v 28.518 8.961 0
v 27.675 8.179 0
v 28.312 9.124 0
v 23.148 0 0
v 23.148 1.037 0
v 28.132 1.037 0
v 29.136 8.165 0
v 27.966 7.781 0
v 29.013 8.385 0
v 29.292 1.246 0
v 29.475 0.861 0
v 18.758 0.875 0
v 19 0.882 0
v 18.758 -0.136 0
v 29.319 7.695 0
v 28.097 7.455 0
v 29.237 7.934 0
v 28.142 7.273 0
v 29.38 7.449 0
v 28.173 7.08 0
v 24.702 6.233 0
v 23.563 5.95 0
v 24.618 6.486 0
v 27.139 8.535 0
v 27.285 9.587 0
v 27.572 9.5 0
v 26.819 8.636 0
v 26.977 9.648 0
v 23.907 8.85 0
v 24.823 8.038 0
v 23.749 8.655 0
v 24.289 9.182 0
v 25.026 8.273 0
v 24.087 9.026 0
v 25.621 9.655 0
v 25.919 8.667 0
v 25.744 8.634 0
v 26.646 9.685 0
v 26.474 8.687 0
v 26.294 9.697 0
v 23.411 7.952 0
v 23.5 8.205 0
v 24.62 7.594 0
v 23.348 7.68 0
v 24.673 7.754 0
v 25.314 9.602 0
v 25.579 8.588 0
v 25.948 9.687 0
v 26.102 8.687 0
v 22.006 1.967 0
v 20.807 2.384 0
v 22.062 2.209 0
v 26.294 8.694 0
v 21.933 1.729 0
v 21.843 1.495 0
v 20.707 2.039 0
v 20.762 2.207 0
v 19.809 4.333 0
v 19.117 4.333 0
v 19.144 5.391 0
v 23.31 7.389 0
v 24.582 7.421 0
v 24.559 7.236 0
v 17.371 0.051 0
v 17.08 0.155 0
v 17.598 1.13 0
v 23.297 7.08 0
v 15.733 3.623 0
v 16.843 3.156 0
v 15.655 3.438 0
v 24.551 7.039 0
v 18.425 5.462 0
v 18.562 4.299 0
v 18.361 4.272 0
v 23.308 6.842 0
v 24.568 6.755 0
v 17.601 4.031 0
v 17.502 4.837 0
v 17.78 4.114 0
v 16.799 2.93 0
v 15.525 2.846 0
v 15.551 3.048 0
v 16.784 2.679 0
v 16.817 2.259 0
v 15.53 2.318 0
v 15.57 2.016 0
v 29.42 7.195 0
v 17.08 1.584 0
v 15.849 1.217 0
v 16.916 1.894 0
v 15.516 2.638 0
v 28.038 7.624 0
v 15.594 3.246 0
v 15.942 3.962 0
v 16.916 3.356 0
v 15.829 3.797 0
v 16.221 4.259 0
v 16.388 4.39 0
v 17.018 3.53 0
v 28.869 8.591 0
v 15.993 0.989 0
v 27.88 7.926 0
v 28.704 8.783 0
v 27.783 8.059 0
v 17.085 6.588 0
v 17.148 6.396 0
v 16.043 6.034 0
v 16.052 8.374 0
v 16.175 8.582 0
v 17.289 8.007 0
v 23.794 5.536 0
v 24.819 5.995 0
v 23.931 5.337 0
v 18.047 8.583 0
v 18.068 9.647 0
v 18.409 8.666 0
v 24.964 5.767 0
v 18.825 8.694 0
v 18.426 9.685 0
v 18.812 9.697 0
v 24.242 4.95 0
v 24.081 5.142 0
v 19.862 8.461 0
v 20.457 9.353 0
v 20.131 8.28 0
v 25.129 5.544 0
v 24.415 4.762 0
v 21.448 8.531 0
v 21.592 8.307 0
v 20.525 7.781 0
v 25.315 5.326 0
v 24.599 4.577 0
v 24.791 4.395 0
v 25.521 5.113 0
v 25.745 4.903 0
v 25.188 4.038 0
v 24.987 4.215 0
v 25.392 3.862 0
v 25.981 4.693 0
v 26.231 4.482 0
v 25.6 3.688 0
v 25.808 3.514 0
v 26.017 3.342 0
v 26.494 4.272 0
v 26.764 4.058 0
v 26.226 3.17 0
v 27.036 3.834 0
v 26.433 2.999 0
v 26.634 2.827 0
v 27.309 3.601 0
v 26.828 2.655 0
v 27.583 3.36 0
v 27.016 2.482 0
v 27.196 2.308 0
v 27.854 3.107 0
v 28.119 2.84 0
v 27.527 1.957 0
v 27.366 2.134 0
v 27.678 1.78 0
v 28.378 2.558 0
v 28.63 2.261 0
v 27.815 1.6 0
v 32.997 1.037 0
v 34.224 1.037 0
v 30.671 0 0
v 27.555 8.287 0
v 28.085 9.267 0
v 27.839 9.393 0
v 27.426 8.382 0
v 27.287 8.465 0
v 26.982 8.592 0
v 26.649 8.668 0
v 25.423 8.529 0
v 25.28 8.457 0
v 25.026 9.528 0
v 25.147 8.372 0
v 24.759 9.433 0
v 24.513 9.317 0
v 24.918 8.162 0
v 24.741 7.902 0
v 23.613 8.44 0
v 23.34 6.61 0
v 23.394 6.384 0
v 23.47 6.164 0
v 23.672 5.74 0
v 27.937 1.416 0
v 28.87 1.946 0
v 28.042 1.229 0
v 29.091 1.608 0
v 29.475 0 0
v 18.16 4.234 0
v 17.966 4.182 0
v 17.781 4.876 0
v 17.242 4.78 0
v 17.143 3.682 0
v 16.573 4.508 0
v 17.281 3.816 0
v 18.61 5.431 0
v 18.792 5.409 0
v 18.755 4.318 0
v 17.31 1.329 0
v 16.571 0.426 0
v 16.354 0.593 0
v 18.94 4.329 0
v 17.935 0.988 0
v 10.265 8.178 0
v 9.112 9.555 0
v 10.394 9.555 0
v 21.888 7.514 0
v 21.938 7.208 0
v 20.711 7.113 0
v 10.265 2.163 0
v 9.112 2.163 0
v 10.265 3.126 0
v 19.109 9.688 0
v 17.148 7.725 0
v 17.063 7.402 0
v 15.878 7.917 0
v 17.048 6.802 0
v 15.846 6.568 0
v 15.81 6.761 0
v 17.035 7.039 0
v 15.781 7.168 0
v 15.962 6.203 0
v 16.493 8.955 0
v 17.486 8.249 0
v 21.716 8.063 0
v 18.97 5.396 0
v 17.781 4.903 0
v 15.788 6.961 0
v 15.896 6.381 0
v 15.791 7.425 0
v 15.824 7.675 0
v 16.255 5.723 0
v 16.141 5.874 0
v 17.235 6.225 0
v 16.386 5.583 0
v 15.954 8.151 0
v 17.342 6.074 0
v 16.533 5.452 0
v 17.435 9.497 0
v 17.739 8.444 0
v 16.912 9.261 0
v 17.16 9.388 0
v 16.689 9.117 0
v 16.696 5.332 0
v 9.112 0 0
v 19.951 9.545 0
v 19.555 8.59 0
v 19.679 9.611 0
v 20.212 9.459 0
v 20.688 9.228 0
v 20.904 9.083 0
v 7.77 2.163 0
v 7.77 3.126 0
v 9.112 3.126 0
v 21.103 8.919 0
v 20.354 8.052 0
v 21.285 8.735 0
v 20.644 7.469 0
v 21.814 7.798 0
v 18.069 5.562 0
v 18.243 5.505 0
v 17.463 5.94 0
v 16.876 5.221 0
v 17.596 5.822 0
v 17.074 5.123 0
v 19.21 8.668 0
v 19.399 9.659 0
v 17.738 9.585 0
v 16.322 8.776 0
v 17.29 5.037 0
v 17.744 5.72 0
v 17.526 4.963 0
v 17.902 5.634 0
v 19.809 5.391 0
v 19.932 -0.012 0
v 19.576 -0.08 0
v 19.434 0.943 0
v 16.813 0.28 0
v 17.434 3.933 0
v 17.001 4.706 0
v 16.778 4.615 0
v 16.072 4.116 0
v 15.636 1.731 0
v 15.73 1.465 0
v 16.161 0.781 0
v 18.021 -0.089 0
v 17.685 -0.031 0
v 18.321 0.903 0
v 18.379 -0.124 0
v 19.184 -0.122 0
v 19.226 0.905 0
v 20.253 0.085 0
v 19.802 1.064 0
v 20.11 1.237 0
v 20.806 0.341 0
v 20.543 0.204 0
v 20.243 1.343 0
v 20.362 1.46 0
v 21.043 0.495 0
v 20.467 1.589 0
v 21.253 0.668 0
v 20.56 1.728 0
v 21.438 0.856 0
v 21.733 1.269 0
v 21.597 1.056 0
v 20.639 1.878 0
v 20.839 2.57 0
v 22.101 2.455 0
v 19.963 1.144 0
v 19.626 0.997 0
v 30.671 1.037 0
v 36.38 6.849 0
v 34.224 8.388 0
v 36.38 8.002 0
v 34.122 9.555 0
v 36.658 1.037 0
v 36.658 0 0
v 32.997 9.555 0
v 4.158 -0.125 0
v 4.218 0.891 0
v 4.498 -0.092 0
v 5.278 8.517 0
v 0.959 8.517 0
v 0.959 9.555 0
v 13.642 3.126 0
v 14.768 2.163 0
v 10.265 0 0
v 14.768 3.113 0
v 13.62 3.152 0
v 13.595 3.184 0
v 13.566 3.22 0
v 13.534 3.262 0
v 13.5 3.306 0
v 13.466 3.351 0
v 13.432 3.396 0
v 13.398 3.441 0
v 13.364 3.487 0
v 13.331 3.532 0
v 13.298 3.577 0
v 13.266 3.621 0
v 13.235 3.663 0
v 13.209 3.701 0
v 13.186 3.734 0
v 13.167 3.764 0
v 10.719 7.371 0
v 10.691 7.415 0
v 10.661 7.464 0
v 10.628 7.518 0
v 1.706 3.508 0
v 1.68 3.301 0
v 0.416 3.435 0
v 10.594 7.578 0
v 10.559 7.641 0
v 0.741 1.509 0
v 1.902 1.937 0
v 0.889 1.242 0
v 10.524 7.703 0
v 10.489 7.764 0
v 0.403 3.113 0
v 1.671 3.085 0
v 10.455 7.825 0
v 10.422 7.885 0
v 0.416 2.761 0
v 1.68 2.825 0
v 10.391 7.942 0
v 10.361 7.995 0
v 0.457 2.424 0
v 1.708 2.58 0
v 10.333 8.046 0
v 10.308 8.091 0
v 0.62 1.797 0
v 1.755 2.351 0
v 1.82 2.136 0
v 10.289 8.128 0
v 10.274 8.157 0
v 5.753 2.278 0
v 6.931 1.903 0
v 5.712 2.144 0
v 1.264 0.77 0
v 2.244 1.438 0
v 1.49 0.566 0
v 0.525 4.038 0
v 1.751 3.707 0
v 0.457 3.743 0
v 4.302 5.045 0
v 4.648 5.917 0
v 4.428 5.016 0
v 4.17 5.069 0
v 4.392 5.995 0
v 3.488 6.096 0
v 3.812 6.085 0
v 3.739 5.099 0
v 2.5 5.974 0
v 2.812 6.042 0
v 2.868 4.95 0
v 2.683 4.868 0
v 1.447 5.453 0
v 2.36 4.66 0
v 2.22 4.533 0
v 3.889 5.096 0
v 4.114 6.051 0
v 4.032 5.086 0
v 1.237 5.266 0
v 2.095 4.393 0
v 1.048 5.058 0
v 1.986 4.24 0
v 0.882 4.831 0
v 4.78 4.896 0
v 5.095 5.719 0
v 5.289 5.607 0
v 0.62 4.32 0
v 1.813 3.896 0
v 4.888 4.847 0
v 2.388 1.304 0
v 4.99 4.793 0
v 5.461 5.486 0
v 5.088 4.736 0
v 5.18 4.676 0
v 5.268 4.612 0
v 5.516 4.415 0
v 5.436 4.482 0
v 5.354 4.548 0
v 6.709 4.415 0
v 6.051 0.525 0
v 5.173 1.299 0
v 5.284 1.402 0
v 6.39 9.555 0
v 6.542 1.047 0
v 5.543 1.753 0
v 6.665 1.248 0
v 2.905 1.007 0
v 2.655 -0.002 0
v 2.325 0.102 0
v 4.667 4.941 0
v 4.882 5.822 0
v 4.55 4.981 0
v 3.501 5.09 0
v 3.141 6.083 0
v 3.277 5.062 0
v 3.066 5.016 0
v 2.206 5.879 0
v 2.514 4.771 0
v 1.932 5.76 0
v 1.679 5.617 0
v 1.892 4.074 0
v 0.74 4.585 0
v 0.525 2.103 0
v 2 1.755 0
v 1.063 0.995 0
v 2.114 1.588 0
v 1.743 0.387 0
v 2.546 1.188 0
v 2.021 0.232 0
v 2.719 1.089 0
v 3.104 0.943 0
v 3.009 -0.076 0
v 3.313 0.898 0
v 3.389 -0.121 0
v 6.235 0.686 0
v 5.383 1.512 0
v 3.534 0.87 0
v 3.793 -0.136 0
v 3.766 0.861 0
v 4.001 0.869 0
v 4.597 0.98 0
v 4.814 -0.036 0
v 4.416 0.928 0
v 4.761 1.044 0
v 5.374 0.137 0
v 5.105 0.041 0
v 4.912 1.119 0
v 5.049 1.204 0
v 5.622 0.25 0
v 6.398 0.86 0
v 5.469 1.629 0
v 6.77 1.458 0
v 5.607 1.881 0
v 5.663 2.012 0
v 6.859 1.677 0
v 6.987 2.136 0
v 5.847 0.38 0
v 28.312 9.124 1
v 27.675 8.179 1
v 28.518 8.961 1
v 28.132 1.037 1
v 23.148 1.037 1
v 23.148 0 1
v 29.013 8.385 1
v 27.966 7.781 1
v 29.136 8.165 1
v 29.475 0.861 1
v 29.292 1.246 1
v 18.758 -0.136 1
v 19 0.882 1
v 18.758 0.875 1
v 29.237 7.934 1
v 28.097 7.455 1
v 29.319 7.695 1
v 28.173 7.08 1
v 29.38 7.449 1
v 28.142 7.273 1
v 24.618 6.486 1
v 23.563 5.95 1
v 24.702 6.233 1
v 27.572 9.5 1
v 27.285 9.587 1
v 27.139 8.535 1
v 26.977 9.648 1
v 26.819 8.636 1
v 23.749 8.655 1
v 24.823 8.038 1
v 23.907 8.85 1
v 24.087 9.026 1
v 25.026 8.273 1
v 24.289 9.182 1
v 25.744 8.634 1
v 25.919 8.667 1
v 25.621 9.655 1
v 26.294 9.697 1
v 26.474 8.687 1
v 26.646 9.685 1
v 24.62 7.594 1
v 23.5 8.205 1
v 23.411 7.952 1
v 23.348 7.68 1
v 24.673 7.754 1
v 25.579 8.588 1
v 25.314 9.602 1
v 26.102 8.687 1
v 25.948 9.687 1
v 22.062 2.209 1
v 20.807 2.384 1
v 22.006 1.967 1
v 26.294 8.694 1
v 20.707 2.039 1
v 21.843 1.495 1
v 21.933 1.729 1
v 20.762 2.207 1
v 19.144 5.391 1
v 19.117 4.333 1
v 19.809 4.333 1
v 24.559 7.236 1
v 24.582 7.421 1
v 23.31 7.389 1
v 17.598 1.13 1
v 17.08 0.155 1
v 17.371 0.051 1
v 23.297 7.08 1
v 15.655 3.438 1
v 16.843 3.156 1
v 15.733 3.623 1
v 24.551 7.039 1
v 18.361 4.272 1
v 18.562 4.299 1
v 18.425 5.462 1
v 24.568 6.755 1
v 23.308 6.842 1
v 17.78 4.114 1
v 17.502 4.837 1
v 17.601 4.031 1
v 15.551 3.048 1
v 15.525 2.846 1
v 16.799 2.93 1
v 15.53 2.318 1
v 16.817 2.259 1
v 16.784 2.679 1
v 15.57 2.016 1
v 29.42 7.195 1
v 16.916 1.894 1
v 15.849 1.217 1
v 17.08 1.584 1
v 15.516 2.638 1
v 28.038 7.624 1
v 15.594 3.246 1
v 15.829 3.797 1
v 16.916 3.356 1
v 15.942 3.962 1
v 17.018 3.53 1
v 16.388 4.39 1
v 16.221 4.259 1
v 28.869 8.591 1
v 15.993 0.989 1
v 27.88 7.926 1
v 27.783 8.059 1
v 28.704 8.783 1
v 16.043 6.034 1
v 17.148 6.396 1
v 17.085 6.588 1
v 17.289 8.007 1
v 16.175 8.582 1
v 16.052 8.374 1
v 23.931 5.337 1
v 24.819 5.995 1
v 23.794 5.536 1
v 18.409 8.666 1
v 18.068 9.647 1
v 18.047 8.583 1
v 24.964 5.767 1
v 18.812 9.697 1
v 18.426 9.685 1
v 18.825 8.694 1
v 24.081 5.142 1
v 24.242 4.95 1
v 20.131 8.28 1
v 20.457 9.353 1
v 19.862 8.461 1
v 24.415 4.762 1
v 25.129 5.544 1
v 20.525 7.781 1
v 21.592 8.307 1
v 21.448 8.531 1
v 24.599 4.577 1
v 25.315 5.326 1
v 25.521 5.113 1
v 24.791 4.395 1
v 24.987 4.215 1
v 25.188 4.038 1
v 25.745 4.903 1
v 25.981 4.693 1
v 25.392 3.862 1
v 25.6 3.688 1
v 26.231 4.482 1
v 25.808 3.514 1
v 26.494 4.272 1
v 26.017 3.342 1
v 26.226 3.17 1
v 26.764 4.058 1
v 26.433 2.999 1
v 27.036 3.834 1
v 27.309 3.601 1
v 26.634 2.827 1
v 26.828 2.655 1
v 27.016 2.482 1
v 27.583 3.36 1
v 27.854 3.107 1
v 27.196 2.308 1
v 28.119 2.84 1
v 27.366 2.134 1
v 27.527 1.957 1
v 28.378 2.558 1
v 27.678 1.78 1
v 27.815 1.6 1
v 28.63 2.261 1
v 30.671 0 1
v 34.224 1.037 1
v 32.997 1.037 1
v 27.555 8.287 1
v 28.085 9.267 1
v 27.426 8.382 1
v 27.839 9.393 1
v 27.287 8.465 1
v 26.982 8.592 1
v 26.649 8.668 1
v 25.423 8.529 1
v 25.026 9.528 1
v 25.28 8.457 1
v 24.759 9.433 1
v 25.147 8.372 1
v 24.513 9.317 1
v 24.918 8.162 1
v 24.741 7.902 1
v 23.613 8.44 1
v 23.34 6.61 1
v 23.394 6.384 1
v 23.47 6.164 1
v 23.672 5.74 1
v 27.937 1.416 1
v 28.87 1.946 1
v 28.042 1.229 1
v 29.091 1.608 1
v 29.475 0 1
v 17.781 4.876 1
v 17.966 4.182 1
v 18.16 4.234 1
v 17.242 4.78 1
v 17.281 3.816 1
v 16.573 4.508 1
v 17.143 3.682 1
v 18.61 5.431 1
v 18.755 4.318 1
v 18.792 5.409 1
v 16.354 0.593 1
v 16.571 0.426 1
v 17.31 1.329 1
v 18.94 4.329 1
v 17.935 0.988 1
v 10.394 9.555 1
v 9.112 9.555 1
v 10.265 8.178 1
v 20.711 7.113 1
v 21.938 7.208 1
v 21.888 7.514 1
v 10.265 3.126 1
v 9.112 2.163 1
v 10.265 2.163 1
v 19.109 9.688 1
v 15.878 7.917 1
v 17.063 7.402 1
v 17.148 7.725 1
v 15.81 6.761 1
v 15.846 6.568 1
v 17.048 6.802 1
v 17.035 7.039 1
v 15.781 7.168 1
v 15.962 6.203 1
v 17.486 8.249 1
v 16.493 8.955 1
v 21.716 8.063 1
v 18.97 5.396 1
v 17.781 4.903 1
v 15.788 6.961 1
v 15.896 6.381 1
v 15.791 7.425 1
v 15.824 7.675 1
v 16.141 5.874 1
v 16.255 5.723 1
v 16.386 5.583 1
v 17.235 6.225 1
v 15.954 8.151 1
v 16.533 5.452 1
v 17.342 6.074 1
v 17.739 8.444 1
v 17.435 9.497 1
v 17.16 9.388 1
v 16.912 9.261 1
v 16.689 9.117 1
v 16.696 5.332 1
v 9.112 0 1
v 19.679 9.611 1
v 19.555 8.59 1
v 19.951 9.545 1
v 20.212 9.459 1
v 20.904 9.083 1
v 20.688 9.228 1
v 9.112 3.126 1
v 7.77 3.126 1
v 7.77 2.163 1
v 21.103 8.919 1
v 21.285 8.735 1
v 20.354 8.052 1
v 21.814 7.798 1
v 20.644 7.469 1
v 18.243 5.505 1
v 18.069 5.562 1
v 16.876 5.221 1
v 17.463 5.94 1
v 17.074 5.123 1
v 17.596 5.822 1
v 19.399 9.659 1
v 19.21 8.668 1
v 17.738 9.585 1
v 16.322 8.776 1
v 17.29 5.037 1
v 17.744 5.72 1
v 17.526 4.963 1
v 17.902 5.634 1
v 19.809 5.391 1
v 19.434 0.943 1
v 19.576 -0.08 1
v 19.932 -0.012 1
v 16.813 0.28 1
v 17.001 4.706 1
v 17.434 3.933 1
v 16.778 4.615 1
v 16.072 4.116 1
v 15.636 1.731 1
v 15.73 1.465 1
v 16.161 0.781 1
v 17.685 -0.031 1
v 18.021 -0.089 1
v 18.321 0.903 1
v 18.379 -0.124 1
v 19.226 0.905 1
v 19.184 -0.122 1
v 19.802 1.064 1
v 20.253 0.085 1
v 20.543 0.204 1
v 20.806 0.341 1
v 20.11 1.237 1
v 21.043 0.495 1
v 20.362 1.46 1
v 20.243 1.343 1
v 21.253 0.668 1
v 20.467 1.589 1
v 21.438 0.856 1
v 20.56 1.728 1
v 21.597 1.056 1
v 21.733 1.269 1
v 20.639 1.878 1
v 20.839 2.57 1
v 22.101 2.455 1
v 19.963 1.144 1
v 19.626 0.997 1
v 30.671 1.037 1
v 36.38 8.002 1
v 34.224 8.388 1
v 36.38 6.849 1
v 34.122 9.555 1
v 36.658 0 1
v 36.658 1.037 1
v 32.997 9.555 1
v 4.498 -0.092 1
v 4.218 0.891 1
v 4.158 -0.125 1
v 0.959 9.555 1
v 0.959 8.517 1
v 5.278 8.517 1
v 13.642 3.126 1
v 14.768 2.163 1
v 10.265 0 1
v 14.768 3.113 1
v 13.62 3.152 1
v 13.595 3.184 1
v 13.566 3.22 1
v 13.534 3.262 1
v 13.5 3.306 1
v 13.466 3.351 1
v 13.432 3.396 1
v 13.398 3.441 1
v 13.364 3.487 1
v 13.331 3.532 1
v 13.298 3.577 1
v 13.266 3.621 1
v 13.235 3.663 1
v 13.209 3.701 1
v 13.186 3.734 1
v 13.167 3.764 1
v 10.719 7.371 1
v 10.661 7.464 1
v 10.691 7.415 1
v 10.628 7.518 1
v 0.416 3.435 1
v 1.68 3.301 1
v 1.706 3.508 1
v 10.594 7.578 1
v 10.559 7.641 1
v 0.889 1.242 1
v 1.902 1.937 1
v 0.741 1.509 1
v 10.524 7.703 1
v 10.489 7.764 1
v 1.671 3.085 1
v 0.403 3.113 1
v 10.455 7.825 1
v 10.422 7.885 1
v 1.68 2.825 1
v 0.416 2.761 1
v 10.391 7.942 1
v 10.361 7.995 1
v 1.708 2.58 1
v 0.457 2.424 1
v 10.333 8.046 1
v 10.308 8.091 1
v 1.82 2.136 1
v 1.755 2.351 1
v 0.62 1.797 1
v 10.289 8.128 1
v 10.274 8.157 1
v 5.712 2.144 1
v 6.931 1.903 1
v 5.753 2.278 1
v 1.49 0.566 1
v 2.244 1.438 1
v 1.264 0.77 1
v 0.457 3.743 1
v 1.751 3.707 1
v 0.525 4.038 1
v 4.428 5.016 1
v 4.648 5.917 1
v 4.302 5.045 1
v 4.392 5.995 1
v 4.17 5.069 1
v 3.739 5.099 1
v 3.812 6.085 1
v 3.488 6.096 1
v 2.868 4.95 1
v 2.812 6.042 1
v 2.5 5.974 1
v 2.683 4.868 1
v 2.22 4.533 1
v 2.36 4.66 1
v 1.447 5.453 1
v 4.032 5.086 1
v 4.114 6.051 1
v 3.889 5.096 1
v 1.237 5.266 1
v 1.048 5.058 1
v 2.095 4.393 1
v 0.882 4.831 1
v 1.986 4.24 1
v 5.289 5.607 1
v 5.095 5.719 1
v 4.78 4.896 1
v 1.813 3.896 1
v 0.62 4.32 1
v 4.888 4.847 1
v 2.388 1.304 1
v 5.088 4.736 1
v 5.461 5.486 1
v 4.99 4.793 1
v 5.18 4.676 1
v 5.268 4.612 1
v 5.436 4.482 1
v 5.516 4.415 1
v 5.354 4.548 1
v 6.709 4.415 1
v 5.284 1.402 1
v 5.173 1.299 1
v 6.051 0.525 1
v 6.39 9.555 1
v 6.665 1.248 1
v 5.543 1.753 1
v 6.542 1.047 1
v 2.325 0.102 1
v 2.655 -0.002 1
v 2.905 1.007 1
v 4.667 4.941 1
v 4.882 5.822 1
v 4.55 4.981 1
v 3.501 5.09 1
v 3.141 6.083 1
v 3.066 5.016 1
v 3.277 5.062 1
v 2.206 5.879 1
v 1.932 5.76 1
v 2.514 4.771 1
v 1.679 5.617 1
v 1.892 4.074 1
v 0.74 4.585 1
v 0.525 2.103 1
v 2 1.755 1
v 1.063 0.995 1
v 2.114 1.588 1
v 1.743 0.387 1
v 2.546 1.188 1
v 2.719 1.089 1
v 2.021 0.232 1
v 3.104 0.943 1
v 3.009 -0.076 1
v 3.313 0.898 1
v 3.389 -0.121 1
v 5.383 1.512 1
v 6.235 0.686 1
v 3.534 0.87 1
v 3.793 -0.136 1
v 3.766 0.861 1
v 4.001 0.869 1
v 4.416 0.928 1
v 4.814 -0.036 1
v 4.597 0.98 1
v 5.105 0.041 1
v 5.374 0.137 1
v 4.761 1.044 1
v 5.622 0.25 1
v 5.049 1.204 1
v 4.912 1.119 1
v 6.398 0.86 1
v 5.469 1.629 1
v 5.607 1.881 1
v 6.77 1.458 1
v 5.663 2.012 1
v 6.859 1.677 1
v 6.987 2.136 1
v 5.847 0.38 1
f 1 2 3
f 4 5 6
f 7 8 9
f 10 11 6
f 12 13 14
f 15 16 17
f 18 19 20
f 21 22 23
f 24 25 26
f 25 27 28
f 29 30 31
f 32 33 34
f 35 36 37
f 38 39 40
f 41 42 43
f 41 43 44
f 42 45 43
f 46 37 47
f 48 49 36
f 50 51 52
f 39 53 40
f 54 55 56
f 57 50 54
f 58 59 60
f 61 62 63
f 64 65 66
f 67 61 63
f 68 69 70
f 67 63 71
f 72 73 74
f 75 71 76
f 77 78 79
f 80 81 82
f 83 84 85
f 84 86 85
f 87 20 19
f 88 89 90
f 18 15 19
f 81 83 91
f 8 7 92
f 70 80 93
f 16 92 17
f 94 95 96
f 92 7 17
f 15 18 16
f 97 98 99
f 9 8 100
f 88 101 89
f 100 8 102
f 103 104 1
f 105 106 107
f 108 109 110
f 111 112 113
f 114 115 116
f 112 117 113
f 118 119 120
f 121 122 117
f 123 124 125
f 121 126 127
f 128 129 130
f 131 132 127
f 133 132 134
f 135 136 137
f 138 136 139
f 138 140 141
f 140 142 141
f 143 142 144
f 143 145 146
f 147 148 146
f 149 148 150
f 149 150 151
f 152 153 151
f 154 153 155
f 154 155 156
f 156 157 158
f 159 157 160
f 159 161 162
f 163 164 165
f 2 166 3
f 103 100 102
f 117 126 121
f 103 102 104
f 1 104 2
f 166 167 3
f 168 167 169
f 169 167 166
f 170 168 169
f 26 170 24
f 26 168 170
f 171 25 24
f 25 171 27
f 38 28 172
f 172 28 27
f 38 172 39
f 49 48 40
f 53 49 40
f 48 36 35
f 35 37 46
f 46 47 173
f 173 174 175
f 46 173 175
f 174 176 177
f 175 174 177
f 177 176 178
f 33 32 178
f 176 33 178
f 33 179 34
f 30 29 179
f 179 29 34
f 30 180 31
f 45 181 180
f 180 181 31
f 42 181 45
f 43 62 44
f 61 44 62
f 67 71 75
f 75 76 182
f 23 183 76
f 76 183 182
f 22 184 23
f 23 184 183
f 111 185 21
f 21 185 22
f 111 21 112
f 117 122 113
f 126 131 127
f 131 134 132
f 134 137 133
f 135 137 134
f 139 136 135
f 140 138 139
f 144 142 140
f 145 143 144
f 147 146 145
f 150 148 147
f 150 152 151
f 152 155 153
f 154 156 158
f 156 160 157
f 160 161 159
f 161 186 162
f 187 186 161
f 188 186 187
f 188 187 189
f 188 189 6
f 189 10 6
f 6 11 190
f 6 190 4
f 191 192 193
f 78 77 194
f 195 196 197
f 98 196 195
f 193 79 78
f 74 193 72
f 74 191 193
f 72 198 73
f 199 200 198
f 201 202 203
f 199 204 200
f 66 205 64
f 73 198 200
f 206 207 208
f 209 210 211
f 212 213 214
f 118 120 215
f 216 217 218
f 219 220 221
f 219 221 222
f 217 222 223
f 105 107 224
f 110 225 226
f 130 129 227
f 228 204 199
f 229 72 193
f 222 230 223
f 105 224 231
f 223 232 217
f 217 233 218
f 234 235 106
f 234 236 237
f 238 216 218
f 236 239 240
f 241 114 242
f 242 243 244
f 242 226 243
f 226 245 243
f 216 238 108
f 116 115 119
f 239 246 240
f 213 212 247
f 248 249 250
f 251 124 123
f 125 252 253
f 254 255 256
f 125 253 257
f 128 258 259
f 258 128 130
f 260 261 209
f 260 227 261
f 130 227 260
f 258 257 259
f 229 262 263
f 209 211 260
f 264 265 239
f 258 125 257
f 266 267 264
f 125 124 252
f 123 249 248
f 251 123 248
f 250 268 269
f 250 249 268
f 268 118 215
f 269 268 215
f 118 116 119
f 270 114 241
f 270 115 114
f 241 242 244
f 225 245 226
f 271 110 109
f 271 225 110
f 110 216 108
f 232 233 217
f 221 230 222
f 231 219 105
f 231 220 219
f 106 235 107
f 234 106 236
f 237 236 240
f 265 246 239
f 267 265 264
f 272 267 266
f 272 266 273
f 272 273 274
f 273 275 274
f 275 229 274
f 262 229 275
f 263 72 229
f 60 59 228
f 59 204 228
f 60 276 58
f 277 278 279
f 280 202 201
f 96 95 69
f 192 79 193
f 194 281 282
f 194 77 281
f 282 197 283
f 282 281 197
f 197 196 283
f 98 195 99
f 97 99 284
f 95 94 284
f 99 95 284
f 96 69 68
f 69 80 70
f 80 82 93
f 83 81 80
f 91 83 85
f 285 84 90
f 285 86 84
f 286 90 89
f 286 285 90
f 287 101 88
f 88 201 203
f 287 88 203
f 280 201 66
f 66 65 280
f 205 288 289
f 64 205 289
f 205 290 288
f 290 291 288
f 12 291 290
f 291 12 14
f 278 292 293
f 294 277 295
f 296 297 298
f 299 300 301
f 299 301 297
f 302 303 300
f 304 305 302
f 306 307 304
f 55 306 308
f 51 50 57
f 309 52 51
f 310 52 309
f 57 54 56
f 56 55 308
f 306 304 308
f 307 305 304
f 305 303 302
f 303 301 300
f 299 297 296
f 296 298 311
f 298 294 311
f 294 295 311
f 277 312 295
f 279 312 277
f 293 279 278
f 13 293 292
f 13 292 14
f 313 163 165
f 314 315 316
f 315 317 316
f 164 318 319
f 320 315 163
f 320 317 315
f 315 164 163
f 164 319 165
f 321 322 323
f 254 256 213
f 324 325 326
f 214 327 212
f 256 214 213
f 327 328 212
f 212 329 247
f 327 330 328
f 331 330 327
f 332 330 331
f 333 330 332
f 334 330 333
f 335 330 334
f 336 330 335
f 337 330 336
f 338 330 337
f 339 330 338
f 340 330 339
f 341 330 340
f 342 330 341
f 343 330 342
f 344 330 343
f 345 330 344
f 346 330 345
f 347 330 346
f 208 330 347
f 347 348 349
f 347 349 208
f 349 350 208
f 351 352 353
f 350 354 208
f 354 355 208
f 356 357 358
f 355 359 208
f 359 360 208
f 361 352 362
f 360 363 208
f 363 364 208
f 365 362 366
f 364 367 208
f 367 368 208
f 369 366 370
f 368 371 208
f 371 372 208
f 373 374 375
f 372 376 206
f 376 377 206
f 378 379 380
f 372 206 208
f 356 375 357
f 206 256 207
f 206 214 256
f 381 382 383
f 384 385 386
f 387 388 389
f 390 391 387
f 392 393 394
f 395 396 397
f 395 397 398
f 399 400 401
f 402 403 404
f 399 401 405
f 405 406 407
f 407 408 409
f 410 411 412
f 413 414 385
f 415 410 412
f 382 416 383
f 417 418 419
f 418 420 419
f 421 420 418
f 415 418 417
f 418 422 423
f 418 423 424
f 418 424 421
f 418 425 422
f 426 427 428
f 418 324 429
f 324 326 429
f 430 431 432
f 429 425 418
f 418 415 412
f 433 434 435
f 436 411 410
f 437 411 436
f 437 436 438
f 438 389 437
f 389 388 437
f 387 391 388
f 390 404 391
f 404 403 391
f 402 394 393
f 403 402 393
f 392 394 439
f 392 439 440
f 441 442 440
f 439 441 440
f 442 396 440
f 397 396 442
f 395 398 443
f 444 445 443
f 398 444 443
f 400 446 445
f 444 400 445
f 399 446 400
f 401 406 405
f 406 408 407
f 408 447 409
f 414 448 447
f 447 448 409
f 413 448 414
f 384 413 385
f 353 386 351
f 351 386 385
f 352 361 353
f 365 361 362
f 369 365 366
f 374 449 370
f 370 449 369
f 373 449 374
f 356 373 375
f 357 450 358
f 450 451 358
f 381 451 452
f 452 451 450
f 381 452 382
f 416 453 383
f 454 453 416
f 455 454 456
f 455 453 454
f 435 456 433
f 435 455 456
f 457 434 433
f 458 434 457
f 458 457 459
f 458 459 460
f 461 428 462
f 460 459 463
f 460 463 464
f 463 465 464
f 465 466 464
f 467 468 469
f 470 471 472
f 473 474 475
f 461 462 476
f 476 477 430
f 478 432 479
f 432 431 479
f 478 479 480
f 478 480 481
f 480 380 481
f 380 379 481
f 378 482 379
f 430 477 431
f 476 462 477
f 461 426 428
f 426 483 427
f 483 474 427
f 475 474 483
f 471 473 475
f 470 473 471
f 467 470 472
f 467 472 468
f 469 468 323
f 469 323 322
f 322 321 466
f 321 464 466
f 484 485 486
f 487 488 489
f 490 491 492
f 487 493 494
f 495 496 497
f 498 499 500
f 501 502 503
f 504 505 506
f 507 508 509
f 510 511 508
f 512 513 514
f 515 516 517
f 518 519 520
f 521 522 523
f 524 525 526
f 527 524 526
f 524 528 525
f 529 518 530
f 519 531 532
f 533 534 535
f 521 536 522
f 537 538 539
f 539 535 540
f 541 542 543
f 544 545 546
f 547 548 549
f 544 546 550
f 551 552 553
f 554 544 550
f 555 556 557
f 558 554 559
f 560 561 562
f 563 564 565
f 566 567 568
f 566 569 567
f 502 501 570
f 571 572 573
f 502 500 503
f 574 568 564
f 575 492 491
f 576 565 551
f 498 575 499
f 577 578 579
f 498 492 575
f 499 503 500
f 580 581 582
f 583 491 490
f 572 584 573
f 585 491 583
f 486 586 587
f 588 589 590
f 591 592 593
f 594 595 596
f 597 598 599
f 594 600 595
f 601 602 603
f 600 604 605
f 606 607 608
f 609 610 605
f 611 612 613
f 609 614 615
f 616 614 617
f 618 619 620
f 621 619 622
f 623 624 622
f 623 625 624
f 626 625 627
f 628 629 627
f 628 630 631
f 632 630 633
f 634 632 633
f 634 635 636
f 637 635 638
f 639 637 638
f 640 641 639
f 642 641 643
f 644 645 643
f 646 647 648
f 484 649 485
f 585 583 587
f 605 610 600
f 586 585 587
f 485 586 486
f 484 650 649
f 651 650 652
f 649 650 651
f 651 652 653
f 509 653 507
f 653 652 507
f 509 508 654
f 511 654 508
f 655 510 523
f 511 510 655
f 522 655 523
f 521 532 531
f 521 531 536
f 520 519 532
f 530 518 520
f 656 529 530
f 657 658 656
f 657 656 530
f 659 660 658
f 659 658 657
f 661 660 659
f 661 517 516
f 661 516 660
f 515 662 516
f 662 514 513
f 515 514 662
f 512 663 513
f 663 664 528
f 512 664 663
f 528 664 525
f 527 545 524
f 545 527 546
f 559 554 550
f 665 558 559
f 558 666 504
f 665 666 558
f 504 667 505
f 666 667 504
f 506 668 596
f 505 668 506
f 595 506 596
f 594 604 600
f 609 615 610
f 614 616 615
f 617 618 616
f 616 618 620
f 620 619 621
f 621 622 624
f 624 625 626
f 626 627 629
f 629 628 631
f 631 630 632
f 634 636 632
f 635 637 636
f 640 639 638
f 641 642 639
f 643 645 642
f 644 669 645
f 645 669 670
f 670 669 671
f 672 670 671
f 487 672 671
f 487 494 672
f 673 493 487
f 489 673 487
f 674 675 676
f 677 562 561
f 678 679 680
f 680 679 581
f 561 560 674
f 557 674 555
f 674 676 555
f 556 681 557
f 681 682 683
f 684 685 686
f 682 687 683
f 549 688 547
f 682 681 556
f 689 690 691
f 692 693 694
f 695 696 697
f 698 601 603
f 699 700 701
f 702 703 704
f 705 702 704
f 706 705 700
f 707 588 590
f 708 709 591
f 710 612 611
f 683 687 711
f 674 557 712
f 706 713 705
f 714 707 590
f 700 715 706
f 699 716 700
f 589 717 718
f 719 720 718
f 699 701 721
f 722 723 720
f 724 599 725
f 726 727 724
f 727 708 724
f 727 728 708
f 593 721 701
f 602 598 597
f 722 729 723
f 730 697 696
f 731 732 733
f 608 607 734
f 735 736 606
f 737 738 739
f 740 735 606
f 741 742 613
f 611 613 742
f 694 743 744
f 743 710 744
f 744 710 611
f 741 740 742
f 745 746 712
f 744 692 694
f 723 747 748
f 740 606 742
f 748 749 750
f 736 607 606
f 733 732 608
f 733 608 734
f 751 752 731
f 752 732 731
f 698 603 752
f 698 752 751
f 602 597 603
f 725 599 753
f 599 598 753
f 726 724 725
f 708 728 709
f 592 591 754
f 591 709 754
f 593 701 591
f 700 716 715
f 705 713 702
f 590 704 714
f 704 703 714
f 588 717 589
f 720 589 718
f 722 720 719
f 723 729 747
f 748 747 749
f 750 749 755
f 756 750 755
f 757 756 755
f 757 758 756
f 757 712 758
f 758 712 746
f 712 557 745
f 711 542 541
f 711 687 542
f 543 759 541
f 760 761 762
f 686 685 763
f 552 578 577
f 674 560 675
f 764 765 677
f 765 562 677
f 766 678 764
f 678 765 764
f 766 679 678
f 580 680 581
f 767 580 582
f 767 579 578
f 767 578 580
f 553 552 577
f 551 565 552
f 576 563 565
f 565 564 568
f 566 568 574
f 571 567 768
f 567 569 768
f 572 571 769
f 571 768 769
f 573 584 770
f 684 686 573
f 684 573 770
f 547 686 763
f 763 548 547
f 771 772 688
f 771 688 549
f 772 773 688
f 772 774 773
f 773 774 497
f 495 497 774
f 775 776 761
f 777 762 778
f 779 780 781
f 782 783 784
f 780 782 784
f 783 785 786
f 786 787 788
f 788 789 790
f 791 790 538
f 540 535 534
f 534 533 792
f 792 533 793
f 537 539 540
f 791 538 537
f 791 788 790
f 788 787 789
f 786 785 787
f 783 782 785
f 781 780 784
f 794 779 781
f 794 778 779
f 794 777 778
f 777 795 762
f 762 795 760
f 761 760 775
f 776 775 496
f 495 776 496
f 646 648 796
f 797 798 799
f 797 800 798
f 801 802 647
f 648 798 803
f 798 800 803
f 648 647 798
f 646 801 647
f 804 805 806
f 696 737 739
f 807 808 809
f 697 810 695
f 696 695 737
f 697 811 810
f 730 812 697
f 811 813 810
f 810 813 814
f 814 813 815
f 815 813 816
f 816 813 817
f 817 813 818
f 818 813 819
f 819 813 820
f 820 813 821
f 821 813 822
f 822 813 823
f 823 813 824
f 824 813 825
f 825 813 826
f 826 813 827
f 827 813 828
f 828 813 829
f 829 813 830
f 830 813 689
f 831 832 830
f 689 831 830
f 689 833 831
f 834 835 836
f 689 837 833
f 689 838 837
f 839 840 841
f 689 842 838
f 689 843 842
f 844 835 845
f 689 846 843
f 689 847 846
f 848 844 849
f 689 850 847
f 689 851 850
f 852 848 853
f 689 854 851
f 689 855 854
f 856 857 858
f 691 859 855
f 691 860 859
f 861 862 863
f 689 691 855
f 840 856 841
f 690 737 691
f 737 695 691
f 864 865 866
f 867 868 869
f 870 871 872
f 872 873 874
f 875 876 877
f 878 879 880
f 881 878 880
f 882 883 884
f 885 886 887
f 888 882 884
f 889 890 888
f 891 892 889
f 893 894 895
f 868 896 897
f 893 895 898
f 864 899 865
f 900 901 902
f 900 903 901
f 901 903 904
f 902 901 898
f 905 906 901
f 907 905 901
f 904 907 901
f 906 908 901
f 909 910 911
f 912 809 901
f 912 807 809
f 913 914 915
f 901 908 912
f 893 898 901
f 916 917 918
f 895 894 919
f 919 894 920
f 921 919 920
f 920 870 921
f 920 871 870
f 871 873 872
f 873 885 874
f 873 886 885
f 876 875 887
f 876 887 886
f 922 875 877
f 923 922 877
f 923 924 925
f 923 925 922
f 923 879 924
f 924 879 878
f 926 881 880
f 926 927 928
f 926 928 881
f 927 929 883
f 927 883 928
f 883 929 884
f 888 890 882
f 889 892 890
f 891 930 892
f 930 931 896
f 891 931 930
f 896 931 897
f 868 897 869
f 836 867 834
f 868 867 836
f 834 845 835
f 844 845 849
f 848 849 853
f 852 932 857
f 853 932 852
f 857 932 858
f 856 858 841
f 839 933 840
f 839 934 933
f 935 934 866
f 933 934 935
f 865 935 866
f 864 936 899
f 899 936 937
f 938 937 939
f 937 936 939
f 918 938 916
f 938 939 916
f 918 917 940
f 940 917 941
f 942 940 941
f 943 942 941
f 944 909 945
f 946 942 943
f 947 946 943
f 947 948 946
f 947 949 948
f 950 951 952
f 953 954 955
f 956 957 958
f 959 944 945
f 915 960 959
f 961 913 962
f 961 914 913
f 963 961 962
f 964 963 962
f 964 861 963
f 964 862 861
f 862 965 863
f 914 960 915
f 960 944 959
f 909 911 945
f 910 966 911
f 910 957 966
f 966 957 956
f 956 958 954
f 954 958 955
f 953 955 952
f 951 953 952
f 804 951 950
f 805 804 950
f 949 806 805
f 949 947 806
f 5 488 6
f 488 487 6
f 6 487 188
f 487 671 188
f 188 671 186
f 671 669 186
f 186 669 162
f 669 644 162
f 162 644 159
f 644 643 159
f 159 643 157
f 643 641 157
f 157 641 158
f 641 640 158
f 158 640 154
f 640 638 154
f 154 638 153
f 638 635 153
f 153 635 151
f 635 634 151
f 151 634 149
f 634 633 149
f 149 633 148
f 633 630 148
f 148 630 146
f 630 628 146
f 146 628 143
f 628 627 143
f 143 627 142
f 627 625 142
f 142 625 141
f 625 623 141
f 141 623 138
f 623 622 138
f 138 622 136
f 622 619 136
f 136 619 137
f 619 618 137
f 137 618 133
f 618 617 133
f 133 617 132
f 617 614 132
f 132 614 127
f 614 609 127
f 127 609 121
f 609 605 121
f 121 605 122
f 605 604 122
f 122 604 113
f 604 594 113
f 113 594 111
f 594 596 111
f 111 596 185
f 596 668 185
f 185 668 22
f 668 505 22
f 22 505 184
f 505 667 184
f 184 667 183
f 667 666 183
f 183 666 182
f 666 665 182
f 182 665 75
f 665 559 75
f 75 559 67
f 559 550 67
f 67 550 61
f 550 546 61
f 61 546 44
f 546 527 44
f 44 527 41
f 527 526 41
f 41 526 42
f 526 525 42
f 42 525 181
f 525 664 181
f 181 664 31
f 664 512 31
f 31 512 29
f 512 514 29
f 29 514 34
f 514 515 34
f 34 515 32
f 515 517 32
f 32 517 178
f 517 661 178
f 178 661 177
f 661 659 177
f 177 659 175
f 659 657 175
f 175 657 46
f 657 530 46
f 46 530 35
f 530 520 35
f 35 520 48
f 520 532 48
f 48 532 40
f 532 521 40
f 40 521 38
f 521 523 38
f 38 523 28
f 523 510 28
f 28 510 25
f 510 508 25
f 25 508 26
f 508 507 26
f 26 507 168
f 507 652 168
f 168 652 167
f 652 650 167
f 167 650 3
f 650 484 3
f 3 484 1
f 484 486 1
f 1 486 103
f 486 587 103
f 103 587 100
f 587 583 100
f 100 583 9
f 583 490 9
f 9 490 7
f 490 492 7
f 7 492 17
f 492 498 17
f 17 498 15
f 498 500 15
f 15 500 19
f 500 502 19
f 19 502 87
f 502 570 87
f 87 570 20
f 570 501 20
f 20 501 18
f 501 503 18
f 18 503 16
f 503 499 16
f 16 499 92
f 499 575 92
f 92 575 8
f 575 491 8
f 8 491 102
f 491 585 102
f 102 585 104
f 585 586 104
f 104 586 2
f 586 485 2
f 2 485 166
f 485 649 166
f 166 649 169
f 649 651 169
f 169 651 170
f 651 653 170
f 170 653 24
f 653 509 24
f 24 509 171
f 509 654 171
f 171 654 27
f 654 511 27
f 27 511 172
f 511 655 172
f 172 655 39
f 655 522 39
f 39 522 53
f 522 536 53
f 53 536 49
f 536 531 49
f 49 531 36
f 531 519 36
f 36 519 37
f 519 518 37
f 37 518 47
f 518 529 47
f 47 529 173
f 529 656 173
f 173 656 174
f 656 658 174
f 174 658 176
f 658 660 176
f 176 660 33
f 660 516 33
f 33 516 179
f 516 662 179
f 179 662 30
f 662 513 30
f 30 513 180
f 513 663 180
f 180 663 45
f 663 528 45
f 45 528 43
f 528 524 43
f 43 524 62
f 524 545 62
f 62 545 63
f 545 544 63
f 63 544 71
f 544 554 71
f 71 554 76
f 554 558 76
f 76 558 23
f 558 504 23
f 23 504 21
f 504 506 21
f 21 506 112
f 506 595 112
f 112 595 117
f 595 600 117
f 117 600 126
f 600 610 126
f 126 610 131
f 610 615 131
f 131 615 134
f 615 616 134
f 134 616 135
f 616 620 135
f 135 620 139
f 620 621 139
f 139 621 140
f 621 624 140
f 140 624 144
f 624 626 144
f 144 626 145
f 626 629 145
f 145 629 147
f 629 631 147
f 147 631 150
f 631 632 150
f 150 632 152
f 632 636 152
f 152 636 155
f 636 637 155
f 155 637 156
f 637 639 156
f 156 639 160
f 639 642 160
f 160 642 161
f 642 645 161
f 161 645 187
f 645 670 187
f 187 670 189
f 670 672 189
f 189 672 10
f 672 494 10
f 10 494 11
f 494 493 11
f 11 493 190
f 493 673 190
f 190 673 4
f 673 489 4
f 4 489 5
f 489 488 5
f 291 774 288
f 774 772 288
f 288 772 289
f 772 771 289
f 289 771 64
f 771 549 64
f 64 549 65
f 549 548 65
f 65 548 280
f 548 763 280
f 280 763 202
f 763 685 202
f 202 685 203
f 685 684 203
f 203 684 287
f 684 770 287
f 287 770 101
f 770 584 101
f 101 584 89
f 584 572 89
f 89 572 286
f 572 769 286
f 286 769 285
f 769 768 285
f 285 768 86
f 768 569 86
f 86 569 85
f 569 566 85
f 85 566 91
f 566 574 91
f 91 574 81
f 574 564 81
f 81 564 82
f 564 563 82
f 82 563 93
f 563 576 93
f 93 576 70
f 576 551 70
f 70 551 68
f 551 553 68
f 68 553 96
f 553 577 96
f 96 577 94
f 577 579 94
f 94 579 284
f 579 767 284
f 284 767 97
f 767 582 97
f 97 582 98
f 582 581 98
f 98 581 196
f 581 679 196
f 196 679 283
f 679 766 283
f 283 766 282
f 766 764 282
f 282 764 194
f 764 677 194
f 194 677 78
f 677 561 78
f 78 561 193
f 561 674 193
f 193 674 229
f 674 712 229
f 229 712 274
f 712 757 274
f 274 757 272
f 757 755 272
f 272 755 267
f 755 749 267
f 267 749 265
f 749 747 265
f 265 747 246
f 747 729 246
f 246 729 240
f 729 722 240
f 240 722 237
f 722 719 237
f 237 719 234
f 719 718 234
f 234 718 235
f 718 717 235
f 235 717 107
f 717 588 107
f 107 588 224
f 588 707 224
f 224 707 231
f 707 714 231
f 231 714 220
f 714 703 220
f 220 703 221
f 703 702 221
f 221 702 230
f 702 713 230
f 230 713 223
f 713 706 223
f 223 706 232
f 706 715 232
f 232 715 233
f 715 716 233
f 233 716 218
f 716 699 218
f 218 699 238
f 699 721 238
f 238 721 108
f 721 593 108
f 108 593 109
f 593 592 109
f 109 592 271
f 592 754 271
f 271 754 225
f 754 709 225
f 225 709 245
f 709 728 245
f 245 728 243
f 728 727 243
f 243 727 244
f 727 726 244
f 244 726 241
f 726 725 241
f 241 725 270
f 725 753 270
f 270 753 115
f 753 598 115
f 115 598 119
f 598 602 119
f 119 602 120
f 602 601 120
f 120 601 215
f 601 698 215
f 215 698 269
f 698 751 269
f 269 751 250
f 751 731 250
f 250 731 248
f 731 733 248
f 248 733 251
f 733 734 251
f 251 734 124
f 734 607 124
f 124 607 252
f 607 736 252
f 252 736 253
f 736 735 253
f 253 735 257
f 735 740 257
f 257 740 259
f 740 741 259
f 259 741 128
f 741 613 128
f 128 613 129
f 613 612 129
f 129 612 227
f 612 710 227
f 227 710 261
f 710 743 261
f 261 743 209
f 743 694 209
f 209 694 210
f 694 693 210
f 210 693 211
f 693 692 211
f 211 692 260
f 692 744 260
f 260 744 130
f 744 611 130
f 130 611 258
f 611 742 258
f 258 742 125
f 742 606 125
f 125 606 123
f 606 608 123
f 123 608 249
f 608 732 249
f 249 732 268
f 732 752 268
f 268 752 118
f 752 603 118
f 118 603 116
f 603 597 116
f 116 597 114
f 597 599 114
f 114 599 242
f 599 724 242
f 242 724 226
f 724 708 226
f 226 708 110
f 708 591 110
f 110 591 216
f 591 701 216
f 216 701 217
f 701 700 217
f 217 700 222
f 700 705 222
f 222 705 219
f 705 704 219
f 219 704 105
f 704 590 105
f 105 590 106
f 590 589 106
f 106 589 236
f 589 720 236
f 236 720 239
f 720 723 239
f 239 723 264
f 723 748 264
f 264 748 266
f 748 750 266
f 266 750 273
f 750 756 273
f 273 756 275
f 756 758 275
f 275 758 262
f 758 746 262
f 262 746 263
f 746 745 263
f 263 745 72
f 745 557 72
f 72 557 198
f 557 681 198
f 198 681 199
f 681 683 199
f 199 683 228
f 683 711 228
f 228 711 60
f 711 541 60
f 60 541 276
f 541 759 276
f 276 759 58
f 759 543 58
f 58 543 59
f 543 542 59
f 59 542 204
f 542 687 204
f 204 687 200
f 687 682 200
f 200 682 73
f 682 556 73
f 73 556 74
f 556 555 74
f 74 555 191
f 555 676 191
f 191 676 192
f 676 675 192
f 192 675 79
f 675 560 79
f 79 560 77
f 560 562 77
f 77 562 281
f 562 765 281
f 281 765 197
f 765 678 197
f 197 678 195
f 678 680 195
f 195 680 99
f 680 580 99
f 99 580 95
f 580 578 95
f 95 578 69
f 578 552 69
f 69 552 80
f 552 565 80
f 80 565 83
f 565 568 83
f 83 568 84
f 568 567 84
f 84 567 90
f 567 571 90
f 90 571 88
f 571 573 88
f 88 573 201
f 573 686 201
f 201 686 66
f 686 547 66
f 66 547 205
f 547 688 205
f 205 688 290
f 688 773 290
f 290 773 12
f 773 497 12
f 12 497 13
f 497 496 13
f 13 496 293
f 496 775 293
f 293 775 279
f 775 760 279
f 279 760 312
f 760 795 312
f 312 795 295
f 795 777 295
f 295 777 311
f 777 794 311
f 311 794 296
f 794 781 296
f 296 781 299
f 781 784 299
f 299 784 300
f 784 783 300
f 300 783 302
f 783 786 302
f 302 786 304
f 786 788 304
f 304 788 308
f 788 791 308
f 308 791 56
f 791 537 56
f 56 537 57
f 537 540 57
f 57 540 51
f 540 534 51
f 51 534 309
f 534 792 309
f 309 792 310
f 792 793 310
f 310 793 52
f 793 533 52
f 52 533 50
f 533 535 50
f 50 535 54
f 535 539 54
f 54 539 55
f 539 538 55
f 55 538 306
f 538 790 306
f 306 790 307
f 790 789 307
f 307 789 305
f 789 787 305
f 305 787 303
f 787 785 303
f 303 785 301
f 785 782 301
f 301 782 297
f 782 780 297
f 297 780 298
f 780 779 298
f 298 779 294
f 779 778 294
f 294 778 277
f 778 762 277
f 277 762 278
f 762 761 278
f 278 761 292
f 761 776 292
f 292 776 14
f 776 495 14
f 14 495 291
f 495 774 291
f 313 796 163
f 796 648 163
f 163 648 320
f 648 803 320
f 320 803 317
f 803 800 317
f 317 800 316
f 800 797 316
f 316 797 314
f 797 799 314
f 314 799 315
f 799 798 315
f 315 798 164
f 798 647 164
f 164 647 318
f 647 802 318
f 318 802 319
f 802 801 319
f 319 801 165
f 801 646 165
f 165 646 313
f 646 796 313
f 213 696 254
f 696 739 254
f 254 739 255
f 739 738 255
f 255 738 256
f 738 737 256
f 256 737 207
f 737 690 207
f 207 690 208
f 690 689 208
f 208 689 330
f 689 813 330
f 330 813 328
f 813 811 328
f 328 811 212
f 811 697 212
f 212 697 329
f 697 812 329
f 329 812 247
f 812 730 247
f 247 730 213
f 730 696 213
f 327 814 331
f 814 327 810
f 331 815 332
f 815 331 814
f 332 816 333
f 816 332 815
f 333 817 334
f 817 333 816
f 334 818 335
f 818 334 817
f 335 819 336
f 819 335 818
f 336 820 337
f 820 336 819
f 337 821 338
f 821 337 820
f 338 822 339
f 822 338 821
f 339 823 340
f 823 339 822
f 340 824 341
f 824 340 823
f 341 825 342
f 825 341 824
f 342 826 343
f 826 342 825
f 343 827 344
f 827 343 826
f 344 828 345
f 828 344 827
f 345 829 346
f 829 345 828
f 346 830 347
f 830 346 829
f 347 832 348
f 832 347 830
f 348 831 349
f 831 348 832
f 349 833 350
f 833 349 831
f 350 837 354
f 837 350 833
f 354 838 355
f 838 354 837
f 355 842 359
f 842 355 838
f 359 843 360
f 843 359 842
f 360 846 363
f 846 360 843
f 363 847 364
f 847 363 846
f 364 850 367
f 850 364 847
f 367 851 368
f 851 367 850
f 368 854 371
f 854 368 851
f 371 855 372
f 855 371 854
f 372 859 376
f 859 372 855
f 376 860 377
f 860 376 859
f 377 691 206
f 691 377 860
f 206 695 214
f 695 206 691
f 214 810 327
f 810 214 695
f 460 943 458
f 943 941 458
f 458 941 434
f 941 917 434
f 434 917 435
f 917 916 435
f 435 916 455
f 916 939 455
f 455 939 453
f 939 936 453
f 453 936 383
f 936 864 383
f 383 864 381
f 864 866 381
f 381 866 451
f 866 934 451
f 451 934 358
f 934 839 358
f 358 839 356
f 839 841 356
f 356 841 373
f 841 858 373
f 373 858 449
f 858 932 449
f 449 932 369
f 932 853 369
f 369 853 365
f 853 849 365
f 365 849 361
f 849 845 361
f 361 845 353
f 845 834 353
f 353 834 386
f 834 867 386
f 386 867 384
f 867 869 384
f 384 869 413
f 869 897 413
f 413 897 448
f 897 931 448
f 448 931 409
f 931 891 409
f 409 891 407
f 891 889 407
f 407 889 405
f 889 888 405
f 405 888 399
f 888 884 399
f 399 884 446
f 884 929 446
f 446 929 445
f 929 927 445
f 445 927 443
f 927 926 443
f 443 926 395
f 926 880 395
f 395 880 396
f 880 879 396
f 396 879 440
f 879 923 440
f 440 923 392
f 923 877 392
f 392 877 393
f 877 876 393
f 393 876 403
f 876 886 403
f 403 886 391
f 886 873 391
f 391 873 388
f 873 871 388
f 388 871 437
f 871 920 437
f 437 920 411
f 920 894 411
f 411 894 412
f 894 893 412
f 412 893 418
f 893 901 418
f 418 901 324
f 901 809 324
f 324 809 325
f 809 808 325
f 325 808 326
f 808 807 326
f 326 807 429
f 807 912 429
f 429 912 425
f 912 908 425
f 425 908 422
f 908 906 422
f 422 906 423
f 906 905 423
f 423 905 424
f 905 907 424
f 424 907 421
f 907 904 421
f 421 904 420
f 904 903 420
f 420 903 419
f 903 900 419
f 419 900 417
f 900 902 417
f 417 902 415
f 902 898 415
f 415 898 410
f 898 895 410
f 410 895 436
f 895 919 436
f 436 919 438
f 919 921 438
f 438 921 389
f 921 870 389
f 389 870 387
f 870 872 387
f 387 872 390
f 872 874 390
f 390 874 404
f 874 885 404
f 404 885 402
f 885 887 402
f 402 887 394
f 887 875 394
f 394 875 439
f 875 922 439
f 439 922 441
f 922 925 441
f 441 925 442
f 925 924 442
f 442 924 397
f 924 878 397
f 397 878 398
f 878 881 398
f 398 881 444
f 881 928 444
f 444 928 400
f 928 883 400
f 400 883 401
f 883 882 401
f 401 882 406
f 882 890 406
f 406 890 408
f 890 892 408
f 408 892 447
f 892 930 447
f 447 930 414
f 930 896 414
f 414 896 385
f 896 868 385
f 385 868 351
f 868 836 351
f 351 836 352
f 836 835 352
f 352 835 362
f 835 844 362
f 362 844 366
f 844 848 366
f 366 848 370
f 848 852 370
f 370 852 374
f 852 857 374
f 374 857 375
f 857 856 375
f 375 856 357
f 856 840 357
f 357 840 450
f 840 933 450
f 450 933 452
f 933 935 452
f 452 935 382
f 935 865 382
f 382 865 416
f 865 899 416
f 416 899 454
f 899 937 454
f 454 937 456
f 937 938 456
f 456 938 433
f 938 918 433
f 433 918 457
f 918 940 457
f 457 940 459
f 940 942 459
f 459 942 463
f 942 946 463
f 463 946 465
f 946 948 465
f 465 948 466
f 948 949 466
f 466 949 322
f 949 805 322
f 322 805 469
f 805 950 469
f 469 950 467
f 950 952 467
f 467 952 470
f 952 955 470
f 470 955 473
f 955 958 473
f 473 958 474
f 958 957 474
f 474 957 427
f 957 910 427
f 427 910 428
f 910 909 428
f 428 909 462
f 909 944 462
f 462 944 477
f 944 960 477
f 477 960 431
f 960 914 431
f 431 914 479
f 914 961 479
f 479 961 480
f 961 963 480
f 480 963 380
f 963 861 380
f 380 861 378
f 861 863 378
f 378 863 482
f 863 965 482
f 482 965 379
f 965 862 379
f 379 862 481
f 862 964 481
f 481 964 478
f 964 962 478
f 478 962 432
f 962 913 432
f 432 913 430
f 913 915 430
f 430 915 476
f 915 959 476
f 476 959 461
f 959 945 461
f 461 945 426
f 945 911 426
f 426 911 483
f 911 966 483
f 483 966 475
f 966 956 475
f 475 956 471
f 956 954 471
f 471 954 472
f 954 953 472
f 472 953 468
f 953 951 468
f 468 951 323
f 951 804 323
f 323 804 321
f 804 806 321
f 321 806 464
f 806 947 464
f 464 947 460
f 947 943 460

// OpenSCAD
mirror([1,0,0]) linear_extrude(1) text("12345", halign="right");
